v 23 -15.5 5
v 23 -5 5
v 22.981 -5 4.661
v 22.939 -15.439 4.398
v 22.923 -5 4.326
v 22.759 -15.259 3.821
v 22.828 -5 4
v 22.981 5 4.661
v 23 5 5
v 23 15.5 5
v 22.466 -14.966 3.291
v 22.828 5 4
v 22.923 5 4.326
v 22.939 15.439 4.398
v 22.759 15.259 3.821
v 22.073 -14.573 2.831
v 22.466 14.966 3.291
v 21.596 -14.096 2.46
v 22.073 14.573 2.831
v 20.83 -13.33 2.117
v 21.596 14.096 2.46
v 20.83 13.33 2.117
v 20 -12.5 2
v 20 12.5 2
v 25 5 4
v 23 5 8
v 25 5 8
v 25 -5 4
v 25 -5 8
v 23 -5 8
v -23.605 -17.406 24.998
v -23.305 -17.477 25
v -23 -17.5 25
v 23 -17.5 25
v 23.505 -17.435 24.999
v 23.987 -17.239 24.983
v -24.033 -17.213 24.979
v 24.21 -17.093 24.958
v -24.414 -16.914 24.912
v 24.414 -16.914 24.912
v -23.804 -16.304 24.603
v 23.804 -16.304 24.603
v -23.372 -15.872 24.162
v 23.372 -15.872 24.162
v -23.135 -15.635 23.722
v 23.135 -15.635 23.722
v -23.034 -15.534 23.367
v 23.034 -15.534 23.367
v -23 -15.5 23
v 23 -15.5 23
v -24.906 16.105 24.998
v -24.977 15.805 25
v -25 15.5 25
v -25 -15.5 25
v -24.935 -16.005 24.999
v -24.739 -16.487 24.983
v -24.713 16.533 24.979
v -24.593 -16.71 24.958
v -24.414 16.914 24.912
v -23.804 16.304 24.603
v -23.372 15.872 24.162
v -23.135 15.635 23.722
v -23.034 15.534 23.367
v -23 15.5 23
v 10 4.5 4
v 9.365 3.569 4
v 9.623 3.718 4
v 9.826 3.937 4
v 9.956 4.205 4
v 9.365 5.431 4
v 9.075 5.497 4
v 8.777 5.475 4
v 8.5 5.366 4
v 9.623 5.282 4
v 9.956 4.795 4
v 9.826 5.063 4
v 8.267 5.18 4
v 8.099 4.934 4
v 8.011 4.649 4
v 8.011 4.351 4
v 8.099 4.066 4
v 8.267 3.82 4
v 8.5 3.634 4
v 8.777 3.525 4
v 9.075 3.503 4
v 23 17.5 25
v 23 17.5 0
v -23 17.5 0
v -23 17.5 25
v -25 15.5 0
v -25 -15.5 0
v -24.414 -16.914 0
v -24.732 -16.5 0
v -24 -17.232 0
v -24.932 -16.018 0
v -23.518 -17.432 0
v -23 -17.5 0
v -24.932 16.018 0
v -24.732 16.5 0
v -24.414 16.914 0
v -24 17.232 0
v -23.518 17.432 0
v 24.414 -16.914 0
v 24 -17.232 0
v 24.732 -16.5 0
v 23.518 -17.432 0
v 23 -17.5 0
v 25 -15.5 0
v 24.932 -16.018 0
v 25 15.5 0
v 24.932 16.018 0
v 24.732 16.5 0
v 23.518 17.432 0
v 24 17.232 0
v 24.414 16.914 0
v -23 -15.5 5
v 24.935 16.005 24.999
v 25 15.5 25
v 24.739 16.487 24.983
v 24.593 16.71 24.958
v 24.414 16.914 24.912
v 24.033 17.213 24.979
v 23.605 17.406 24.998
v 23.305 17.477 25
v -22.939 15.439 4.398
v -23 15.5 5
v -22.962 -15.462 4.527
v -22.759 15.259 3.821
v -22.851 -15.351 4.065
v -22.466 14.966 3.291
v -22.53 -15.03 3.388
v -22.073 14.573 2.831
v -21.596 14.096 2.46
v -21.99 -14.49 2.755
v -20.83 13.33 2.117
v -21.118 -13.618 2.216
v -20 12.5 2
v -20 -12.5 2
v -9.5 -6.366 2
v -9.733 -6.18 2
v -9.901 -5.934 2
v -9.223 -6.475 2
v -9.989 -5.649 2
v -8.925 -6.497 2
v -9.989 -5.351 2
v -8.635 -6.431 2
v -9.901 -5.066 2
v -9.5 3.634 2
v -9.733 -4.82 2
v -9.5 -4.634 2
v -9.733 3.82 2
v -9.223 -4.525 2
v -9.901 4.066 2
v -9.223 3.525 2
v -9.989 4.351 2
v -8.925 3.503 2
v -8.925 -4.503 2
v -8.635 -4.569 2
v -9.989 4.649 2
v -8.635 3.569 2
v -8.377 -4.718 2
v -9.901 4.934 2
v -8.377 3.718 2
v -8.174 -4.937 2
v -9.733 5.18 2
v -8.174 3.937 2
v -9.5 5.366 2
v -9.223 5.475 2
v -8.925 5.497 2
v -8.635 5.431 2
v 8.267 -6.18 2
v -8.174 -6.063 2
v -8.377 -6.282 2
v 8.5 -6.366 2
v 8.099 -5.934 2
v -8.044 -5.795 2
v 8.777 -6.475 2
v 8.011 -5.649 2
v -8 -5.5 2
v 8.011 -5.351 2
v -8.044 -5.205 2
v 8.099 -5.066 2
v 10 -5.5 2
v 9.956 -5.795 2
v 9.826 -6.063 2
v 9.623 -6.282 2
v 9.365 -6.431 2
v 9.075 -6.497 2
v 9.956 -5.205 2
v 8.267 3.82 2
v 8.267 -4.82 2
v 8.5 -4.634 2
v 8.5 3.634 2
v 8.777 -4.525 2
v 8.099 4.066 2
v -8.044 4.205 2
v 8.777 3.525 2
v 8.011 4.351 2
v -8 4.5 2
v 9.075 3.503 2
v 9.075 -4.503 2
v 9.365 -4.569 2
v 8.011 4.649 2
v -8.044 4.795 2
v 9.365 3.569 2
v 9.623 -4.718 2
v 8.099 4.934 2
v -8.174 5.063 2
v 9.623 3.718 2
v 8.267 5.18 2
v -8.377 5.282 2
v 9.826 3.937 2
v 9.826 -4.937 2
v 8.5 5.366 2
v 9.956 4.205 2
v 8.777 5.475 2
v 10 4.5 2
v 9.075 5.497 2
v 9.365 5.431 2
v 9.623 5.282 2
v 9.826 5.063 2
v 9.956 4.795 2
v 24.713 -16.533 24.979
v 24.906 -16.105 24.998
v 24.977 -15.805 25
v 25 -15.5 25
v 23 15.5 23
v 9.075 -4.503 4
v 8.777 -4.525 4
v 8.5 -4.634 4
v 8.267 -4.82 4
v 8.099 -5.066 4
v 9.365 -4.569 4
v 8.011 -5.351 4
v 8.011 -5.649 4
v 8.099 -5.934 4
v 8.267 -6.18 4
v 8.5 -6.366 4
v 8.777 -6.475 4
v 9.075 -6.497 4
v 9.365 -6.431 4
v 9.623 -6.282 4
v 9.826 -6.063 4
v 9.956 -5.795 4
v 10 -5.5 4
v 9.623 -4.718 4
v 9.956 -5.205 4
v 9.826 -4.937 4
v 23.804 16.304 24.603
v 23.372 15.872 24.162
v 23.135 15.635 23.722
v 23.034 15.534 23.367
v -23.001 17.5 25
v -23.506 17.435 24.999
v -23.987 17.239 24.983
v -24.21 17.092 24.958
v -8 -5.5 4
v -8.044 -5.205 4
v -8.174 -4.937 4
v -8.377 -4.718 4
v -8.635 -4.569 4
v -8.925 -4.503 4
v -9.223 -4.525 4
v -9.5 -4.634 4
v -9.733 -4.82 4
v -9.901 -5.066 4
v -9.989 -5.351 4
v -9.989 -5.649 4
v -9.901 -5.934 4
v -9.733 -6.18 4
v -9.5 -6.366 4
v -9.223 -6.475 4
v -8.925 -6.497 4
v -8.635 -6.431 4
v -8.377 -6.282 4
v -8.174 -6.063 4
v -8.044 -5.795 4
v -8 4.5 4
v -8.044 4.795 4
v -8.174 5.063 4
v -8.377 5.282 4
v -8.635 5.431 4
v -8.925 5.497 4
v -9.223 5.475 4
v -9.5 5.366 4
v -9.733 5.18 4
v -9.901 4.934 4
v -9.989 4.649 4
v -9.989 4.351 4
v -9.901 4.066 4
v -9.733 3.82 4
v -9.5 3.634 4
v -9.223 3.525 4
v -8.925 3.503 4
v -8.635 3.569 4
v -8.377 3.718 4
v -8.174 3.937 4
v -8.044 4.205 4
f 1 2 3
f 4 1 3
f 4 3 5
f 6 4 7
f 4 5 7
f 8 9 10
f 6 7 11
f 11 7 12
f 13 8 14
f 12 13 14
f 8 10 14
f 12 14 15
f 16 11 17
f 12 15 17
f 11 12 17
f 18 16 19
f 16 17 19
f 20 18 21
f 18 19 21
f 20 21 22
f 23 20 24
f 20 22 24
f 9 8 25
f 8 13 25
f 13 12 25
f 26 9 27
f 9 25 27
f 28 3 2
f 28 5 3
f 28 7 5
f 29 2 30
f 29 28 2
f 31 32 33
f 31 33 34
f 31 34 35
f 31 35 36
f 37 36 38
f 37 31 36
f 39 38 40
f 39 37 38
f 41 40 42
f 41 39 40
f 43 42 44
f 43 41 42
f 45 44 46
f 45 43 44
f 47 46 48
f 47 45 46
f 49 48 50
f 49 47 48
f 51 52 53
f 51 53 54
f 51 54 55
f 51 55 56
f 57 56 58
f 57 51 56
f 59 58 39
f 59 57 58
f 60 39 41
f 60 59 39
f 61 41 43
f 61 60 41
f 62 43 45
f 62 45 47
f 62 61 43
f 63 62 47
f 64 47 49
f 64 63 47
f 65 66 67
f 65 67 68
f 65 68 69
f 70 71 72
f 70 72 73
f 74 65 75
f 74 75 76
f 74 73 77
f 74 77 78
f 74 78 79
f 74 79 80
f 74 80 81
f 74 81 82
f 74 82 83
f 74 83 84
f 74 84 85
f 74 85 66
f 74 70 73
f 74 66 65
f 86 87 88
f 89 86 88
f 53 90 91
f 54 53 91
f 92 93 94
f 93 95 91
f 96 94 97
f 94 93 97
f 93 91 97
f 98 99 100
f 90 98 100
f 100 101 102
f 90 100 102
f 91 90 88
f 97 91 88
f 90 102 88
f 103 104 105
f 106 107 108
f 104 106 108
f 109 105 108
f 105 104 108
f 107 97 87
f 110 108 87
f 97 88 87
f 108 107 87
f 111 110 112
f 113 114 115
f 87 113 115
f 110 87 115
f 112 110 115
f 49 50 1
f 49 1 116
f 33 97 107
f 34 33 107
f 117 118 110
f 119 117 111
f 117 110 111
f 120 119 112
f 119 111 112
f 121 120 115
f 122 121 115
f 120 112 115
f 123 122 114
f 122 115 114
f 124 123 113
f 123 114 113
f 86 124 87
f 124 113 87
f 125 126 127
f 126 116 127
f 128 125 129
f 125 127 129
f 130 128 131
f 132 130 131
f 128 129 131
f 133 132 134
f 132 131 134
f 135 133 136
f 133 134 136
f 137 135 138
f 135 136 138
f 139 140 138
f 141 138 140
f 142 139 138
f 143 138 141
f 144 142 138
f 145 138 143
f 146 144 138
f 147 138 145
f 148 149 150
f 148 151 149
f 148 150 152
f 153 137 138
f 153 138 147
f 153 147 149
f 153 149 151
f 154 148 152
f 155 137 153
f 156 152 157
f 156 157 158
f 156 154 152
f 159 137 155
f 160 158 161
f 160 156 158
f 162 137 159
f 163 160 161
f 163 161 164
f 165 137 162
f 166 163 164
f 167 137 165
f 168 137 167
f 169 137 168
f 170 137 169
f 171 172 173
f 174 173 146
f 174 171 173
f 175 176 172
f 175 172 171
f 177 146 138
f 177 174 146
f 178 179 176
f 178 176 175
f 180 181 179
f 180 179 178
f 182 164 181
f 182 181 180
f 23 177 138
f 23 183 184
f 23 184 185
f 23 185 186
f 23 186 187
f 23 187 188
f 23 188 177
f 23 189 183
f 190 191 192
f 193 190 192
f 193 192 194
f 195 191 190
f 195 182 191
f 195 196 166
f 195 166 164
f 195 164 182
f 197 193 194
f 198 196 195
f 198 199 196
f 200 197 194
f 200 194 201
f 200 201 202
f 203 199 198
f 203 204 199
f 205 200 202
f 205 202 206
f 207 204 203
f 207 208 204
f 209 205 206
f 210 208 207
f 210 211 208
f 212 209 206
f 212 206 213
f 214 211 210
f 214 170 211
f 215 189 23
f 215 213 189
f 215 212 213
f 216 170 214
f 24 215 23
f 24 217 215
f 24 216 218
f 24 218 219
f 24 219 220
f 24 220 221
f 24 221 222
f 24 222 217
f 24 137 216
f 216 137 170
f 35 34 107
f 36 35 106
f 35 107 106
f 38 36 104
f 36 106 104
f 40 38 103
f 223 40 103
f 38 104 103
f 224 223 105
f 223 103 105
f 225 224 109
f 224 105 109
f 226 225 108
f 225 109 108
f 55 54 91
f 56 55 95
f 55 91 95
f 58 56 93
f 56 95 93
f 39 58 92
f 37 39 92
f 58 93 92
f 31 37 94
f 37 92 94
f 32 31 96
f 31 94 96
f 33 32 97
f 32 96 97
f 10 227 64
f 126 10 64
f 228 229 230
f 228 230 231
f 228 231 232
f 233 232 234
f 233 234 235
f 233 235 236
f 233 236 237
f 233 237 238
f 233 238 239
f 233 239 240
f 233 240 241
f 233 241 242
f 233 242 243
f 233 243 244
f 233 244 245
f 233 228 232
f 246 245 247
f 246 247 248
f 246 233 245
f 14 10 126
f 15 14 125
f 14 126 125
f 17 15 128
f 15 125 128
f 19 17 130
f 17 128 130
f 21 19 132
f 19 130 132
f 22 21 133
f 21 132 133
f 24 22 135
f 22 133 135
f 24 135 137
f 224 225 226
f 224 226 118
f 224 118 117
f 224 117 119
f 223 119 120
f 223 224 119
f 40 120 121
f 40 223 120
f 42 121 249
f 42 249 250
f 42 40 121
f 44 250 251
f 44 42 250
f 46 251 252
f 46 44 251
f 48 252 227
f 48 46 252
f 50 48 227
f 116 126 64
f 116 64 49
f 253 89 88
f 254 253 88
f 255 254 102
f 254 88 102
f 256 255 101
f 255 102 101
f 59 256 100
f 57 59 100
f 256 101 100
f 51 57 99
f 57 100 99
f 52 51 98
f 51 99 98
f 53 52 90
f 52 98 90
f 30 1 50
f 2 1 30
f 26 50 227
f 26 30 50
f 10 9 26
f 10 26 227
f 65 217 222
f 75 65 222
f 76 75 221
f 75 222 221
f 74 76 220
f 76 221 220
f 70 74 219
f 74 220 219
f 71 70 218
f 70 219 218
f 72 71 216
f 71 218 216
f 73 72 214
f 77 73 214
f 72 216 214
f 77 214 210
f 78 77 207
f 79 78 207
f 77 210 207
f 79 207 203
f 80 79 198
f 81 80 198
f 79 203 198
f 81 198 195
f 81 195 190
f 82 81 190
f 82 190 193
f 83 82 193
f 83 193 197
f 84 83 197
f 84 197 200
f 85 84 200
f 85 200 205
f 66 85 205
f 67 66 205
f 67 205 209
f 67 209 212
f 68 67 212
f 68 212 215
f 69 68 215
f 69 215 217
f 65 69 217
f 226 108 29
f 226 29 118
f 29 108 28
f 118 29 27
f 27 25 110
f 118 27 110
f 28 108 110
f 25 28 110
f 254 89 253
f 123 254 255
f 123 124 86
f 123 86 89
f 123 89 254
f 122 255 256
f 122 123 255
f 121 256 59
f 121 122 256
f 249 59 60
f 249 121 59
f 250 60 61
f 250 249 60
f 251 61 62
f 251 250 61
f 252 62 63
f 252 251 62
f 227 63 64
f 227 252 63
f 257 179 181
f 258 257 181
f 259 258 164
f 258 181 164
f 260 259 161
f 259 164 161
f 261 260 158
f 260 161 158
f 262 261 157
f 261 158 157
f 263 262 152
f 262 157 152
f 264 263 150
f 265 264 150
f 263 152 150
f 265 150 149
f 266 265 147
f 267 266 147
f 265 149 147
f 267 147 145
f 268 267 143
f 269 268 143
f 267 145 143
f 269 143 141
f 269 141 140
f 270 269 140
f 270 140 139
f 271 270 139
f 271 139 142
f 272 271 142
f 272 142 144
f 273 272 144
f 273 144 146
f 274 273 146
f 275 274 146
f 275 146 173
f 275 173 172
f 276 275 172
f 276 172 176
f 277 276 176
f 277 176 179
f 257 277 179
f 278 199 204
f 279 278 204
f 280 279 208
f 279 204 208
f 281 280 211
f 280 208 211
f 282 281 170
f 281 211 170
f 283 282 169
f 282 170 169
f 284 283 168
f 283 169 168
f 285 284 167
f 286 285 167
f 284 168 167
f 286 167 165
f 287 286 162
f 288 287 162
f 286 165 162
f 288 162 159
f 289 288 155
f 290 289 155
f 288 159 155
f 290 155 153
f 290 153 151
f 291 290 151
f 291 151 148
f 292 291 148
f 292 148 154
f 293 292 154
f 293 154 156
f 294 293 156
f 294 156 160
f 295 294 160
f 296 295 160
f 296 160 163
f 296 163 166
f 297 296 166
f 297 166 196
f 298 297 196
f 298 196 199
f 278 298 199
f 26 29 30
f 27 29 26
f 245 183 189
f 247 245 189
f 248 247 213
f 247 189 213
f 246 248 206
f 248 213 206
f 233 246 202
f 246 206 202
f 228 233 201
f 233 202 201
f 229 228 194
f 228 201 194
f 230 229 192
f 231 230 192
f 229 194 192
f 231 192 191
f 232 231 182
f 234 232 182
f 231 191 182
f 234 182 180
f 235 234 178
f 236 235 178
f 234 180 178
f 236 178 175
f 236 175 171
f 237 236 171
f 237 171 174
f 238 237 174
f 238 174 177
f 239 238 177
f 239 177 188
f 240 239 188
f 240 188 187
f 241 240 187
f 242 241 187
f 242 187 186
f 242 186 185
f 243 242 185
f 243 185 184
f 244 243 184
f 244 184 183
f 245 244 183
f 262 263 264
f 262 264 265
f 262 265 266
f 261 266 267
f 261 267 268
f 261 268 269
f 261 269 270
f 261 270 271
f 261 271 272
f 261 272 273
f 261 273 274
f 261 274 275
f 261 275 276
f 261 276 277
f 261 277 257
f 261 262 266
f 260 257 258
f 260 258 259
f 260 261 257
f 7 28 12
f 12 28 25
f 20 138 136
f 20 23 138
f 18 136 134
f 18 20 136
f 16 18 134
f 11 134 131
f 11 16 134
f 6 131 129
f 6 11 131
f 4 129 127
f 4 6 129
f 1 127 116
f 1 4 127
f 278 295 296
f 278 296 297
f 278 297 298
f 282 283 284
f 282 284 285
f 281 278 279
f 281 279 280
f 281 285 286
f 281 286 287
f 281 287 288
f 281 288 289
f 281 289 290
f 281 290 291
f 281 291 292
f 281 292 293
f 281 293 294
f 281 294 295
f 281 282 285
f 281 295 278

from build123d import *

# Parameters (mm, degrees)
F1_DEPTH     = 25
F2_T         = 2
F3_T1_DEPTH  = 31
F3_T3_DEPTH  = 46
F3_T9_DEPTH  = 51
F3_T13_DEPTH = 36
F3_T20_DEPTH = 36
F3_T24_DEPTH = 51
F3_T31_DEPTH = 36
F3_T35_DEPTH = 51
F3_T42_DEPTH = 36
F3_T46_DEPTH = 51
F4_R         = 3
F5_R         = 1
F6_DEPTH     = 4
F8_W         = 10
F8_H         = 4
F9_DEPTH     = 4


# Not quite as in the source:
# - a fillet or chamfer that OpenCascade refuses, or shapes differently, is made with other operations: its cross-section is extruded or revolved along the edge and cut away or added
# - a shell that OpenCascade refuses in one call is made with other operations: the cavity is built on its own and cut out


with BuildPart() as f1:
    # F0 (on Top) → F1 (new body)
    with BuildSketch(Plane.XY):
        with BuildLine():
            ThreePointArc((25, 15.5), (24.4142135624, 16.9142135624), (23, 17.5))
            Line((23, 17.5), (-23, 17.5))
            ThreePointArc((-23, 17.5), (-24.4142135624, 16.9142135624), (-25, 15.5))
            Line((-25, 15.5), (-25, -15.5))
            ThreePointArc((-25, -15.5), (-24.4142135624, -16.9142135624), (-23, -17.5))
            Line((-23, -17.5), (23, -17.5))
            ThreePointArc((23, -17.5), (24.4142135624, -16.9142135624), (25, -15.5))
            Line((25, -15.5), (25, 15.5))
        make_face()
    extrude(amount=F1_DEPTH)

    # F2: shell of thickness 2, made by hand


with BuildPart() as f2_core1:
    # F2_t2: copy of F1
    add(f1.part)

    # the walls: a layer under each face that stays
    f2_faces = [f2_core1.faces().sort_by_distance(p)[0] for p in [
        (0, 17.5, 12.5),
        (-25, 0, 12.5),
        (0, -17.5, 12.5),
        (25, 0, 12.5),
        (0, 0, 0),
    ]]
    thicken(f2_faces, amount=-F2_T, mode=Mode.SUBTRACT)


with BuildPart() as f1_1:
    add(f1.part)

    # what is left inside the walls is the cavity
    f2_cavity = [f2_core1.part.solids().sort_by_distance(p)[0] for p in [
        (0, -5.166667, 2.02),
    ]]
    add(f2_cavity, mode=Mode.SUBTRACT)

    # F3: fillet of radius 2 on 4 edges, made by hand

    # F3_s2 → F3_t1 (cut)
    with BuildSketch(Plane.XZ.offset(-15.5)):
        with BuildLine():
            ThreePointArc((-25, 25), (-23.5857864376, 24.4142135624), (-23, 23))
            Line((-23, 23), (-22.96, 23))
            Line((-22.96, 23), (-22.96, 25.04))
            Line((-22.96, 25.04), (-25, 25.04))
            Line((-25, 25.04), (-25, 25))
        make_face()
        with BuildLine():
            ThreePointArc((25, 25), (23.5857864376, 24.4142135624), (23, 23))
            Line((23, 23), (22.96, 23))
            Line((22.96, 23), (22.96, 25.04))
            Line((22.96, 25.04), (25, 25.04))
            Line((25, 25.04), (25, 25))
        make_face()
    extrude(amount=F3_T1_DEPTH, mode=Mode.SUBTRACT)

    # F3_s4 → F3_t3 (cut)
    with BuildSketch(Plane.YZ.offset(-23)):
        with BuildLine():
            ThreePointArc((17.5, 25), (16.0857864376, 24.4142135624), (15.5, 23))
            Line((15.5, 23), (15.46, 23))
            Line((15.46, 23), (15.46, 25.04))
            Line((15.46, 25.04), (17.5, 25.04))
            Line((17.5, 25.04), (17.5, 25))
        make_face()
        with BuildLine():
            ThreePointArc((-17.5, 25), (-16.0857864376, 24.4142135624), (-15.5, 23))
            Line((-15.5, 23), (-15.46, 23))
            Line((-15.46, 23), (-15.46, 25.04))
            Line((-15.46, 25.04), (-17.5, 25.04))
            Line((-17.5, 25.04), (-17.5, 25))
        make_face()
    extrude(amount=F3_T3_DEPTH, mode=Mode.SUBTRACT)


with BuildPart() as f3_tool7:
    # F3_s8 → F3_t9 (new body)
    with BuildSketch(Plane.YZ.offset(23)):
        with BuildLine():
            ThreePointArc((17.5, 25), (16.0857864376, 24.4142135624), (15.5, 23))
            Line((15.5, 23), (15.46, 23))
            Line((15.46, 23), (15.46, 25.04))
            Line((15.46, 25.04), (17.5, 25.04))
            Line((17.5, 25.04), (17.5, 25))
        make_face()
    extrude(amount=-F3_T9_DEPTH)

    split(bisect_by=Plane.YZ.offset(-23), keep=Keep.BOTTOM)


with BuildPart() as f3_tool11:
    # F3_s12 → F3_t13 (new body)
    with BuildSketch(Plane.XZ.offset(-20.5)):
        with BuildLine():
            ThreePointArc((-25, 25), (-23.5857864376, 24.4142135624), (-23, 23))
            Line((-23, 23), (-22.96, 23))
            Line((-22.96, 23), (-22.96, 25.04))
            Line((-22.96, 25.04), (-25, 25.04))
            Line((-25, 25.04), (-25, 25))
        make_face()
    extrude(amount=F3_T13_DEPTH)

    split(bisect_by=Plane.XZ.offset(-15.5), keep=Keep.BOTTOM)


with BuildPart() as f3_tool7_1:
    add(f3_tool7.part)

    # F3_t15: intersect F3_tool11
    add(f3_tool11.part, mode=Mode.INTERSECT)


with BuildPart() as f1_2:
    add(f1_1.part)

    # F3_t5: cut F3_tool7
    add(f3_tool7_1.part, mode=Mode.SUBTRACT)


with BuildPart() as f3_tool18:
    # F3_s19 → F3_t20 (new body)
    with BuildSketch(Plane.XZ.offset(-15.5)):
        with BuildLine():
            ThreePointArc((-25, 25), (-23.5857864376, 24.4142135624), (-23, 23))
            Line((-23, 23), (-22.96, 23))
            Line((-22.96, 23), (-22.96, 25.04))
            Line((-22.96, 25.04), (-25, 25.04))
            Line((-25, 25.04), (-25, 25))
        make_face()
    extrude(amount=F3_T20_DEPTH)

    split(bisect_by=Plane.XZ.offset(15.5), keep=Keep.TOP)


with BuildPart() as f3_tool22:
    # F3_s23 → F3_t24 (new body)
    with BuildSketch(Plane.YZ.offset(-28)):
        with BuildLine():
            ThreePointArc((-17.5, 25), (-16.0857864376, 24.4142135624), (-15.5, 23))
            Line((-15.5, 23), (-15.46, 23))
            Line((-15.46, 23), (-15.46, 25.04))
            Line((-15.46, 25.04), (-17.5, 25.04))
            Line((-17.5, 25.04), (-17.5, 25))
        make_face()
    extrude(amount=F3_T24_DEPTH)

    split(bisect_by=Plane.YZ.offset(-23), keep=Keep.BOTTOM)


with BuildPart() as f3_tool18_1:
    add(f3_tool18.part)

    # F3_t26: intersect F3_tool22
    add(f3_tool22.part, mode=Mode.INTERSECT)


with BuildPart() as f1_3:
    add(f1_2.part)

    # F3_t16: cut F3_tool18
    add(f3_tool18_1.part, mode=Mode.SUBTRACT)


with BuildPart() as f3_tool29:
    # F3_s30 → F3_t31 (new body)
    with BuildSketch(Plane.XZ.offset(15.5)):
        with BuildLine():
            ThreePointArc((25, 25), (23.5857864376, 24.4142135624), (23, 23))
            Line((23, 23), (22.96, 23))
            Line((22.96, 23), (22.96, 25.04))
            Line((22.96, 25.04), (25, 25.04))
            Line((25, 25.04), (25, 25))
        make_face()
    extrude(amount=-F3_T31_DEPTH)

    split(bisect_by=Plane.XZ.offset(-15.5), keep=Keep.BOTTOM)


with BuildPart() as f3_tool33:
    # F3_s34 → F3_t35 (new body)
    with BuildSketch(Plane.YZ.offset(28)):
        with BuildLine():
            ThreePointArc((17.5, 25), (16.0857864376, 24.4142135624), (15.5, 23))
            Line((15.5, 23), (15.46, 23))
            Line((15.46, 23), (15.46, 25.04))
            Line((15.46, 25.04), (17.5, 25.04))
            Line((17.5, 25.04), (17.5, 25))
        make_face()
    extrude(amount=-F3_T35_DEPTH)

    split(bisect_by=Plane.YZ.offset(23), keep=Keep.TOP)


with BuildPart() as f3_tool29_1:
    add(f3_tool29.part)

    # F3_t37: intersect F3_tool33
    add(f3_tool33.part, mode=Mode.INTERSECT)


with BuildPart() as f1_4:
    add(f1_3.part)

    # F3_t27: cut F3_tool29
    add(f3_tool29_1.part, mode=Mode.SUBTRACT)


with BuildPart() as f3_tool40:
    # F3_s41 → F3_t42 (new body)
    with BuildSketch(Plane.XZ.offset(20.5)):
        with BuildLine():
            ThreePointArc((25, 25), (23.5857864376, 24.4142135624), (23, 23))
            Line((23, 23), (22.96, 23))
            Line((22.96, 23), (22.96, 25.04))
            Line((22.96, 25.04), (25, 25.04))
            Line((25, 25.04), (25, 25))
        make_face()
    extrude(amount=-F3_T42_DEPTH)

    split(bisect_by=Plane.XZ.offset(15.5), keep=Keep.TOP)


with BuildPart() as f3_tool44:
    # F3_s45 → F3_t46 (new body)
    with BuildSketch(Plane.YZ.offset(-23)):
        with BuildLine():
            ThreePointArc((-17.5, 25), (-16.0857864376, 24.4142135624), (-15.5, 23))
            Line((-15.5, 23), (-15.46, 23))
            Line((-15.46, 23), (-15.46, 25.04))
            Line((-15.46, 25.04), (-17.5, 25.04))
            Line((-17.5, 25.04), (-17.5, 25))
        make_face()
    extrude(amount=F3_T46_DEPTH)

    split(bisect_by=Plane.YZ.offset(23), keep=Keep.TOP)


with BuildPart() as f3_tool40_1:
    add(f3_tool40.part)

    # F3_t48: intersect F3_tool44
    add(f3_tool44.part, mode=Mode.INTERSECT)


with BuildPart() as f1_5:
    add(f1_4.part)

    # F3_t38: cut F3_tool40
    add(f3_tool40_1.part, mode=Mode.SUBTRACT)

    # F4
    f4_edges = [f1_5.edges().sort_by_distance(p)[0] for p in [
        (0, 15.5, 2),
        (23, 0, 2),
        (0, -15.5, 2),
        (-23, 0, 2),
    ]]
    fillet(f4_edges, radius=F4_R)

    # F5 (on Top) → F6 (join)
    with BuildSketch(Plane.XY):
        with Locations((-9, 4.5)):
            Circle(F5_R)
        with Locations((-9, -5.5)):
            Circle(F5_R)
        with Locations((9, 4.5)):
            Circle(F5_R)
        with Locations((9, -5.5)):
            Circle(F5_R)
    extrude(amount=F6_DEPTH)

    # F8 (on offset) → F9 (cut, symmetric)
    with BuildSketch(Plane.YZ.offset(23.5)):
        with Locations((0, 6)):
            Rectangle(F8_W, F8_H)
    extrude(amount=F9_DEPTH, both=True, mode=Mode.SUBTRACT)


solid = f1_5.part
